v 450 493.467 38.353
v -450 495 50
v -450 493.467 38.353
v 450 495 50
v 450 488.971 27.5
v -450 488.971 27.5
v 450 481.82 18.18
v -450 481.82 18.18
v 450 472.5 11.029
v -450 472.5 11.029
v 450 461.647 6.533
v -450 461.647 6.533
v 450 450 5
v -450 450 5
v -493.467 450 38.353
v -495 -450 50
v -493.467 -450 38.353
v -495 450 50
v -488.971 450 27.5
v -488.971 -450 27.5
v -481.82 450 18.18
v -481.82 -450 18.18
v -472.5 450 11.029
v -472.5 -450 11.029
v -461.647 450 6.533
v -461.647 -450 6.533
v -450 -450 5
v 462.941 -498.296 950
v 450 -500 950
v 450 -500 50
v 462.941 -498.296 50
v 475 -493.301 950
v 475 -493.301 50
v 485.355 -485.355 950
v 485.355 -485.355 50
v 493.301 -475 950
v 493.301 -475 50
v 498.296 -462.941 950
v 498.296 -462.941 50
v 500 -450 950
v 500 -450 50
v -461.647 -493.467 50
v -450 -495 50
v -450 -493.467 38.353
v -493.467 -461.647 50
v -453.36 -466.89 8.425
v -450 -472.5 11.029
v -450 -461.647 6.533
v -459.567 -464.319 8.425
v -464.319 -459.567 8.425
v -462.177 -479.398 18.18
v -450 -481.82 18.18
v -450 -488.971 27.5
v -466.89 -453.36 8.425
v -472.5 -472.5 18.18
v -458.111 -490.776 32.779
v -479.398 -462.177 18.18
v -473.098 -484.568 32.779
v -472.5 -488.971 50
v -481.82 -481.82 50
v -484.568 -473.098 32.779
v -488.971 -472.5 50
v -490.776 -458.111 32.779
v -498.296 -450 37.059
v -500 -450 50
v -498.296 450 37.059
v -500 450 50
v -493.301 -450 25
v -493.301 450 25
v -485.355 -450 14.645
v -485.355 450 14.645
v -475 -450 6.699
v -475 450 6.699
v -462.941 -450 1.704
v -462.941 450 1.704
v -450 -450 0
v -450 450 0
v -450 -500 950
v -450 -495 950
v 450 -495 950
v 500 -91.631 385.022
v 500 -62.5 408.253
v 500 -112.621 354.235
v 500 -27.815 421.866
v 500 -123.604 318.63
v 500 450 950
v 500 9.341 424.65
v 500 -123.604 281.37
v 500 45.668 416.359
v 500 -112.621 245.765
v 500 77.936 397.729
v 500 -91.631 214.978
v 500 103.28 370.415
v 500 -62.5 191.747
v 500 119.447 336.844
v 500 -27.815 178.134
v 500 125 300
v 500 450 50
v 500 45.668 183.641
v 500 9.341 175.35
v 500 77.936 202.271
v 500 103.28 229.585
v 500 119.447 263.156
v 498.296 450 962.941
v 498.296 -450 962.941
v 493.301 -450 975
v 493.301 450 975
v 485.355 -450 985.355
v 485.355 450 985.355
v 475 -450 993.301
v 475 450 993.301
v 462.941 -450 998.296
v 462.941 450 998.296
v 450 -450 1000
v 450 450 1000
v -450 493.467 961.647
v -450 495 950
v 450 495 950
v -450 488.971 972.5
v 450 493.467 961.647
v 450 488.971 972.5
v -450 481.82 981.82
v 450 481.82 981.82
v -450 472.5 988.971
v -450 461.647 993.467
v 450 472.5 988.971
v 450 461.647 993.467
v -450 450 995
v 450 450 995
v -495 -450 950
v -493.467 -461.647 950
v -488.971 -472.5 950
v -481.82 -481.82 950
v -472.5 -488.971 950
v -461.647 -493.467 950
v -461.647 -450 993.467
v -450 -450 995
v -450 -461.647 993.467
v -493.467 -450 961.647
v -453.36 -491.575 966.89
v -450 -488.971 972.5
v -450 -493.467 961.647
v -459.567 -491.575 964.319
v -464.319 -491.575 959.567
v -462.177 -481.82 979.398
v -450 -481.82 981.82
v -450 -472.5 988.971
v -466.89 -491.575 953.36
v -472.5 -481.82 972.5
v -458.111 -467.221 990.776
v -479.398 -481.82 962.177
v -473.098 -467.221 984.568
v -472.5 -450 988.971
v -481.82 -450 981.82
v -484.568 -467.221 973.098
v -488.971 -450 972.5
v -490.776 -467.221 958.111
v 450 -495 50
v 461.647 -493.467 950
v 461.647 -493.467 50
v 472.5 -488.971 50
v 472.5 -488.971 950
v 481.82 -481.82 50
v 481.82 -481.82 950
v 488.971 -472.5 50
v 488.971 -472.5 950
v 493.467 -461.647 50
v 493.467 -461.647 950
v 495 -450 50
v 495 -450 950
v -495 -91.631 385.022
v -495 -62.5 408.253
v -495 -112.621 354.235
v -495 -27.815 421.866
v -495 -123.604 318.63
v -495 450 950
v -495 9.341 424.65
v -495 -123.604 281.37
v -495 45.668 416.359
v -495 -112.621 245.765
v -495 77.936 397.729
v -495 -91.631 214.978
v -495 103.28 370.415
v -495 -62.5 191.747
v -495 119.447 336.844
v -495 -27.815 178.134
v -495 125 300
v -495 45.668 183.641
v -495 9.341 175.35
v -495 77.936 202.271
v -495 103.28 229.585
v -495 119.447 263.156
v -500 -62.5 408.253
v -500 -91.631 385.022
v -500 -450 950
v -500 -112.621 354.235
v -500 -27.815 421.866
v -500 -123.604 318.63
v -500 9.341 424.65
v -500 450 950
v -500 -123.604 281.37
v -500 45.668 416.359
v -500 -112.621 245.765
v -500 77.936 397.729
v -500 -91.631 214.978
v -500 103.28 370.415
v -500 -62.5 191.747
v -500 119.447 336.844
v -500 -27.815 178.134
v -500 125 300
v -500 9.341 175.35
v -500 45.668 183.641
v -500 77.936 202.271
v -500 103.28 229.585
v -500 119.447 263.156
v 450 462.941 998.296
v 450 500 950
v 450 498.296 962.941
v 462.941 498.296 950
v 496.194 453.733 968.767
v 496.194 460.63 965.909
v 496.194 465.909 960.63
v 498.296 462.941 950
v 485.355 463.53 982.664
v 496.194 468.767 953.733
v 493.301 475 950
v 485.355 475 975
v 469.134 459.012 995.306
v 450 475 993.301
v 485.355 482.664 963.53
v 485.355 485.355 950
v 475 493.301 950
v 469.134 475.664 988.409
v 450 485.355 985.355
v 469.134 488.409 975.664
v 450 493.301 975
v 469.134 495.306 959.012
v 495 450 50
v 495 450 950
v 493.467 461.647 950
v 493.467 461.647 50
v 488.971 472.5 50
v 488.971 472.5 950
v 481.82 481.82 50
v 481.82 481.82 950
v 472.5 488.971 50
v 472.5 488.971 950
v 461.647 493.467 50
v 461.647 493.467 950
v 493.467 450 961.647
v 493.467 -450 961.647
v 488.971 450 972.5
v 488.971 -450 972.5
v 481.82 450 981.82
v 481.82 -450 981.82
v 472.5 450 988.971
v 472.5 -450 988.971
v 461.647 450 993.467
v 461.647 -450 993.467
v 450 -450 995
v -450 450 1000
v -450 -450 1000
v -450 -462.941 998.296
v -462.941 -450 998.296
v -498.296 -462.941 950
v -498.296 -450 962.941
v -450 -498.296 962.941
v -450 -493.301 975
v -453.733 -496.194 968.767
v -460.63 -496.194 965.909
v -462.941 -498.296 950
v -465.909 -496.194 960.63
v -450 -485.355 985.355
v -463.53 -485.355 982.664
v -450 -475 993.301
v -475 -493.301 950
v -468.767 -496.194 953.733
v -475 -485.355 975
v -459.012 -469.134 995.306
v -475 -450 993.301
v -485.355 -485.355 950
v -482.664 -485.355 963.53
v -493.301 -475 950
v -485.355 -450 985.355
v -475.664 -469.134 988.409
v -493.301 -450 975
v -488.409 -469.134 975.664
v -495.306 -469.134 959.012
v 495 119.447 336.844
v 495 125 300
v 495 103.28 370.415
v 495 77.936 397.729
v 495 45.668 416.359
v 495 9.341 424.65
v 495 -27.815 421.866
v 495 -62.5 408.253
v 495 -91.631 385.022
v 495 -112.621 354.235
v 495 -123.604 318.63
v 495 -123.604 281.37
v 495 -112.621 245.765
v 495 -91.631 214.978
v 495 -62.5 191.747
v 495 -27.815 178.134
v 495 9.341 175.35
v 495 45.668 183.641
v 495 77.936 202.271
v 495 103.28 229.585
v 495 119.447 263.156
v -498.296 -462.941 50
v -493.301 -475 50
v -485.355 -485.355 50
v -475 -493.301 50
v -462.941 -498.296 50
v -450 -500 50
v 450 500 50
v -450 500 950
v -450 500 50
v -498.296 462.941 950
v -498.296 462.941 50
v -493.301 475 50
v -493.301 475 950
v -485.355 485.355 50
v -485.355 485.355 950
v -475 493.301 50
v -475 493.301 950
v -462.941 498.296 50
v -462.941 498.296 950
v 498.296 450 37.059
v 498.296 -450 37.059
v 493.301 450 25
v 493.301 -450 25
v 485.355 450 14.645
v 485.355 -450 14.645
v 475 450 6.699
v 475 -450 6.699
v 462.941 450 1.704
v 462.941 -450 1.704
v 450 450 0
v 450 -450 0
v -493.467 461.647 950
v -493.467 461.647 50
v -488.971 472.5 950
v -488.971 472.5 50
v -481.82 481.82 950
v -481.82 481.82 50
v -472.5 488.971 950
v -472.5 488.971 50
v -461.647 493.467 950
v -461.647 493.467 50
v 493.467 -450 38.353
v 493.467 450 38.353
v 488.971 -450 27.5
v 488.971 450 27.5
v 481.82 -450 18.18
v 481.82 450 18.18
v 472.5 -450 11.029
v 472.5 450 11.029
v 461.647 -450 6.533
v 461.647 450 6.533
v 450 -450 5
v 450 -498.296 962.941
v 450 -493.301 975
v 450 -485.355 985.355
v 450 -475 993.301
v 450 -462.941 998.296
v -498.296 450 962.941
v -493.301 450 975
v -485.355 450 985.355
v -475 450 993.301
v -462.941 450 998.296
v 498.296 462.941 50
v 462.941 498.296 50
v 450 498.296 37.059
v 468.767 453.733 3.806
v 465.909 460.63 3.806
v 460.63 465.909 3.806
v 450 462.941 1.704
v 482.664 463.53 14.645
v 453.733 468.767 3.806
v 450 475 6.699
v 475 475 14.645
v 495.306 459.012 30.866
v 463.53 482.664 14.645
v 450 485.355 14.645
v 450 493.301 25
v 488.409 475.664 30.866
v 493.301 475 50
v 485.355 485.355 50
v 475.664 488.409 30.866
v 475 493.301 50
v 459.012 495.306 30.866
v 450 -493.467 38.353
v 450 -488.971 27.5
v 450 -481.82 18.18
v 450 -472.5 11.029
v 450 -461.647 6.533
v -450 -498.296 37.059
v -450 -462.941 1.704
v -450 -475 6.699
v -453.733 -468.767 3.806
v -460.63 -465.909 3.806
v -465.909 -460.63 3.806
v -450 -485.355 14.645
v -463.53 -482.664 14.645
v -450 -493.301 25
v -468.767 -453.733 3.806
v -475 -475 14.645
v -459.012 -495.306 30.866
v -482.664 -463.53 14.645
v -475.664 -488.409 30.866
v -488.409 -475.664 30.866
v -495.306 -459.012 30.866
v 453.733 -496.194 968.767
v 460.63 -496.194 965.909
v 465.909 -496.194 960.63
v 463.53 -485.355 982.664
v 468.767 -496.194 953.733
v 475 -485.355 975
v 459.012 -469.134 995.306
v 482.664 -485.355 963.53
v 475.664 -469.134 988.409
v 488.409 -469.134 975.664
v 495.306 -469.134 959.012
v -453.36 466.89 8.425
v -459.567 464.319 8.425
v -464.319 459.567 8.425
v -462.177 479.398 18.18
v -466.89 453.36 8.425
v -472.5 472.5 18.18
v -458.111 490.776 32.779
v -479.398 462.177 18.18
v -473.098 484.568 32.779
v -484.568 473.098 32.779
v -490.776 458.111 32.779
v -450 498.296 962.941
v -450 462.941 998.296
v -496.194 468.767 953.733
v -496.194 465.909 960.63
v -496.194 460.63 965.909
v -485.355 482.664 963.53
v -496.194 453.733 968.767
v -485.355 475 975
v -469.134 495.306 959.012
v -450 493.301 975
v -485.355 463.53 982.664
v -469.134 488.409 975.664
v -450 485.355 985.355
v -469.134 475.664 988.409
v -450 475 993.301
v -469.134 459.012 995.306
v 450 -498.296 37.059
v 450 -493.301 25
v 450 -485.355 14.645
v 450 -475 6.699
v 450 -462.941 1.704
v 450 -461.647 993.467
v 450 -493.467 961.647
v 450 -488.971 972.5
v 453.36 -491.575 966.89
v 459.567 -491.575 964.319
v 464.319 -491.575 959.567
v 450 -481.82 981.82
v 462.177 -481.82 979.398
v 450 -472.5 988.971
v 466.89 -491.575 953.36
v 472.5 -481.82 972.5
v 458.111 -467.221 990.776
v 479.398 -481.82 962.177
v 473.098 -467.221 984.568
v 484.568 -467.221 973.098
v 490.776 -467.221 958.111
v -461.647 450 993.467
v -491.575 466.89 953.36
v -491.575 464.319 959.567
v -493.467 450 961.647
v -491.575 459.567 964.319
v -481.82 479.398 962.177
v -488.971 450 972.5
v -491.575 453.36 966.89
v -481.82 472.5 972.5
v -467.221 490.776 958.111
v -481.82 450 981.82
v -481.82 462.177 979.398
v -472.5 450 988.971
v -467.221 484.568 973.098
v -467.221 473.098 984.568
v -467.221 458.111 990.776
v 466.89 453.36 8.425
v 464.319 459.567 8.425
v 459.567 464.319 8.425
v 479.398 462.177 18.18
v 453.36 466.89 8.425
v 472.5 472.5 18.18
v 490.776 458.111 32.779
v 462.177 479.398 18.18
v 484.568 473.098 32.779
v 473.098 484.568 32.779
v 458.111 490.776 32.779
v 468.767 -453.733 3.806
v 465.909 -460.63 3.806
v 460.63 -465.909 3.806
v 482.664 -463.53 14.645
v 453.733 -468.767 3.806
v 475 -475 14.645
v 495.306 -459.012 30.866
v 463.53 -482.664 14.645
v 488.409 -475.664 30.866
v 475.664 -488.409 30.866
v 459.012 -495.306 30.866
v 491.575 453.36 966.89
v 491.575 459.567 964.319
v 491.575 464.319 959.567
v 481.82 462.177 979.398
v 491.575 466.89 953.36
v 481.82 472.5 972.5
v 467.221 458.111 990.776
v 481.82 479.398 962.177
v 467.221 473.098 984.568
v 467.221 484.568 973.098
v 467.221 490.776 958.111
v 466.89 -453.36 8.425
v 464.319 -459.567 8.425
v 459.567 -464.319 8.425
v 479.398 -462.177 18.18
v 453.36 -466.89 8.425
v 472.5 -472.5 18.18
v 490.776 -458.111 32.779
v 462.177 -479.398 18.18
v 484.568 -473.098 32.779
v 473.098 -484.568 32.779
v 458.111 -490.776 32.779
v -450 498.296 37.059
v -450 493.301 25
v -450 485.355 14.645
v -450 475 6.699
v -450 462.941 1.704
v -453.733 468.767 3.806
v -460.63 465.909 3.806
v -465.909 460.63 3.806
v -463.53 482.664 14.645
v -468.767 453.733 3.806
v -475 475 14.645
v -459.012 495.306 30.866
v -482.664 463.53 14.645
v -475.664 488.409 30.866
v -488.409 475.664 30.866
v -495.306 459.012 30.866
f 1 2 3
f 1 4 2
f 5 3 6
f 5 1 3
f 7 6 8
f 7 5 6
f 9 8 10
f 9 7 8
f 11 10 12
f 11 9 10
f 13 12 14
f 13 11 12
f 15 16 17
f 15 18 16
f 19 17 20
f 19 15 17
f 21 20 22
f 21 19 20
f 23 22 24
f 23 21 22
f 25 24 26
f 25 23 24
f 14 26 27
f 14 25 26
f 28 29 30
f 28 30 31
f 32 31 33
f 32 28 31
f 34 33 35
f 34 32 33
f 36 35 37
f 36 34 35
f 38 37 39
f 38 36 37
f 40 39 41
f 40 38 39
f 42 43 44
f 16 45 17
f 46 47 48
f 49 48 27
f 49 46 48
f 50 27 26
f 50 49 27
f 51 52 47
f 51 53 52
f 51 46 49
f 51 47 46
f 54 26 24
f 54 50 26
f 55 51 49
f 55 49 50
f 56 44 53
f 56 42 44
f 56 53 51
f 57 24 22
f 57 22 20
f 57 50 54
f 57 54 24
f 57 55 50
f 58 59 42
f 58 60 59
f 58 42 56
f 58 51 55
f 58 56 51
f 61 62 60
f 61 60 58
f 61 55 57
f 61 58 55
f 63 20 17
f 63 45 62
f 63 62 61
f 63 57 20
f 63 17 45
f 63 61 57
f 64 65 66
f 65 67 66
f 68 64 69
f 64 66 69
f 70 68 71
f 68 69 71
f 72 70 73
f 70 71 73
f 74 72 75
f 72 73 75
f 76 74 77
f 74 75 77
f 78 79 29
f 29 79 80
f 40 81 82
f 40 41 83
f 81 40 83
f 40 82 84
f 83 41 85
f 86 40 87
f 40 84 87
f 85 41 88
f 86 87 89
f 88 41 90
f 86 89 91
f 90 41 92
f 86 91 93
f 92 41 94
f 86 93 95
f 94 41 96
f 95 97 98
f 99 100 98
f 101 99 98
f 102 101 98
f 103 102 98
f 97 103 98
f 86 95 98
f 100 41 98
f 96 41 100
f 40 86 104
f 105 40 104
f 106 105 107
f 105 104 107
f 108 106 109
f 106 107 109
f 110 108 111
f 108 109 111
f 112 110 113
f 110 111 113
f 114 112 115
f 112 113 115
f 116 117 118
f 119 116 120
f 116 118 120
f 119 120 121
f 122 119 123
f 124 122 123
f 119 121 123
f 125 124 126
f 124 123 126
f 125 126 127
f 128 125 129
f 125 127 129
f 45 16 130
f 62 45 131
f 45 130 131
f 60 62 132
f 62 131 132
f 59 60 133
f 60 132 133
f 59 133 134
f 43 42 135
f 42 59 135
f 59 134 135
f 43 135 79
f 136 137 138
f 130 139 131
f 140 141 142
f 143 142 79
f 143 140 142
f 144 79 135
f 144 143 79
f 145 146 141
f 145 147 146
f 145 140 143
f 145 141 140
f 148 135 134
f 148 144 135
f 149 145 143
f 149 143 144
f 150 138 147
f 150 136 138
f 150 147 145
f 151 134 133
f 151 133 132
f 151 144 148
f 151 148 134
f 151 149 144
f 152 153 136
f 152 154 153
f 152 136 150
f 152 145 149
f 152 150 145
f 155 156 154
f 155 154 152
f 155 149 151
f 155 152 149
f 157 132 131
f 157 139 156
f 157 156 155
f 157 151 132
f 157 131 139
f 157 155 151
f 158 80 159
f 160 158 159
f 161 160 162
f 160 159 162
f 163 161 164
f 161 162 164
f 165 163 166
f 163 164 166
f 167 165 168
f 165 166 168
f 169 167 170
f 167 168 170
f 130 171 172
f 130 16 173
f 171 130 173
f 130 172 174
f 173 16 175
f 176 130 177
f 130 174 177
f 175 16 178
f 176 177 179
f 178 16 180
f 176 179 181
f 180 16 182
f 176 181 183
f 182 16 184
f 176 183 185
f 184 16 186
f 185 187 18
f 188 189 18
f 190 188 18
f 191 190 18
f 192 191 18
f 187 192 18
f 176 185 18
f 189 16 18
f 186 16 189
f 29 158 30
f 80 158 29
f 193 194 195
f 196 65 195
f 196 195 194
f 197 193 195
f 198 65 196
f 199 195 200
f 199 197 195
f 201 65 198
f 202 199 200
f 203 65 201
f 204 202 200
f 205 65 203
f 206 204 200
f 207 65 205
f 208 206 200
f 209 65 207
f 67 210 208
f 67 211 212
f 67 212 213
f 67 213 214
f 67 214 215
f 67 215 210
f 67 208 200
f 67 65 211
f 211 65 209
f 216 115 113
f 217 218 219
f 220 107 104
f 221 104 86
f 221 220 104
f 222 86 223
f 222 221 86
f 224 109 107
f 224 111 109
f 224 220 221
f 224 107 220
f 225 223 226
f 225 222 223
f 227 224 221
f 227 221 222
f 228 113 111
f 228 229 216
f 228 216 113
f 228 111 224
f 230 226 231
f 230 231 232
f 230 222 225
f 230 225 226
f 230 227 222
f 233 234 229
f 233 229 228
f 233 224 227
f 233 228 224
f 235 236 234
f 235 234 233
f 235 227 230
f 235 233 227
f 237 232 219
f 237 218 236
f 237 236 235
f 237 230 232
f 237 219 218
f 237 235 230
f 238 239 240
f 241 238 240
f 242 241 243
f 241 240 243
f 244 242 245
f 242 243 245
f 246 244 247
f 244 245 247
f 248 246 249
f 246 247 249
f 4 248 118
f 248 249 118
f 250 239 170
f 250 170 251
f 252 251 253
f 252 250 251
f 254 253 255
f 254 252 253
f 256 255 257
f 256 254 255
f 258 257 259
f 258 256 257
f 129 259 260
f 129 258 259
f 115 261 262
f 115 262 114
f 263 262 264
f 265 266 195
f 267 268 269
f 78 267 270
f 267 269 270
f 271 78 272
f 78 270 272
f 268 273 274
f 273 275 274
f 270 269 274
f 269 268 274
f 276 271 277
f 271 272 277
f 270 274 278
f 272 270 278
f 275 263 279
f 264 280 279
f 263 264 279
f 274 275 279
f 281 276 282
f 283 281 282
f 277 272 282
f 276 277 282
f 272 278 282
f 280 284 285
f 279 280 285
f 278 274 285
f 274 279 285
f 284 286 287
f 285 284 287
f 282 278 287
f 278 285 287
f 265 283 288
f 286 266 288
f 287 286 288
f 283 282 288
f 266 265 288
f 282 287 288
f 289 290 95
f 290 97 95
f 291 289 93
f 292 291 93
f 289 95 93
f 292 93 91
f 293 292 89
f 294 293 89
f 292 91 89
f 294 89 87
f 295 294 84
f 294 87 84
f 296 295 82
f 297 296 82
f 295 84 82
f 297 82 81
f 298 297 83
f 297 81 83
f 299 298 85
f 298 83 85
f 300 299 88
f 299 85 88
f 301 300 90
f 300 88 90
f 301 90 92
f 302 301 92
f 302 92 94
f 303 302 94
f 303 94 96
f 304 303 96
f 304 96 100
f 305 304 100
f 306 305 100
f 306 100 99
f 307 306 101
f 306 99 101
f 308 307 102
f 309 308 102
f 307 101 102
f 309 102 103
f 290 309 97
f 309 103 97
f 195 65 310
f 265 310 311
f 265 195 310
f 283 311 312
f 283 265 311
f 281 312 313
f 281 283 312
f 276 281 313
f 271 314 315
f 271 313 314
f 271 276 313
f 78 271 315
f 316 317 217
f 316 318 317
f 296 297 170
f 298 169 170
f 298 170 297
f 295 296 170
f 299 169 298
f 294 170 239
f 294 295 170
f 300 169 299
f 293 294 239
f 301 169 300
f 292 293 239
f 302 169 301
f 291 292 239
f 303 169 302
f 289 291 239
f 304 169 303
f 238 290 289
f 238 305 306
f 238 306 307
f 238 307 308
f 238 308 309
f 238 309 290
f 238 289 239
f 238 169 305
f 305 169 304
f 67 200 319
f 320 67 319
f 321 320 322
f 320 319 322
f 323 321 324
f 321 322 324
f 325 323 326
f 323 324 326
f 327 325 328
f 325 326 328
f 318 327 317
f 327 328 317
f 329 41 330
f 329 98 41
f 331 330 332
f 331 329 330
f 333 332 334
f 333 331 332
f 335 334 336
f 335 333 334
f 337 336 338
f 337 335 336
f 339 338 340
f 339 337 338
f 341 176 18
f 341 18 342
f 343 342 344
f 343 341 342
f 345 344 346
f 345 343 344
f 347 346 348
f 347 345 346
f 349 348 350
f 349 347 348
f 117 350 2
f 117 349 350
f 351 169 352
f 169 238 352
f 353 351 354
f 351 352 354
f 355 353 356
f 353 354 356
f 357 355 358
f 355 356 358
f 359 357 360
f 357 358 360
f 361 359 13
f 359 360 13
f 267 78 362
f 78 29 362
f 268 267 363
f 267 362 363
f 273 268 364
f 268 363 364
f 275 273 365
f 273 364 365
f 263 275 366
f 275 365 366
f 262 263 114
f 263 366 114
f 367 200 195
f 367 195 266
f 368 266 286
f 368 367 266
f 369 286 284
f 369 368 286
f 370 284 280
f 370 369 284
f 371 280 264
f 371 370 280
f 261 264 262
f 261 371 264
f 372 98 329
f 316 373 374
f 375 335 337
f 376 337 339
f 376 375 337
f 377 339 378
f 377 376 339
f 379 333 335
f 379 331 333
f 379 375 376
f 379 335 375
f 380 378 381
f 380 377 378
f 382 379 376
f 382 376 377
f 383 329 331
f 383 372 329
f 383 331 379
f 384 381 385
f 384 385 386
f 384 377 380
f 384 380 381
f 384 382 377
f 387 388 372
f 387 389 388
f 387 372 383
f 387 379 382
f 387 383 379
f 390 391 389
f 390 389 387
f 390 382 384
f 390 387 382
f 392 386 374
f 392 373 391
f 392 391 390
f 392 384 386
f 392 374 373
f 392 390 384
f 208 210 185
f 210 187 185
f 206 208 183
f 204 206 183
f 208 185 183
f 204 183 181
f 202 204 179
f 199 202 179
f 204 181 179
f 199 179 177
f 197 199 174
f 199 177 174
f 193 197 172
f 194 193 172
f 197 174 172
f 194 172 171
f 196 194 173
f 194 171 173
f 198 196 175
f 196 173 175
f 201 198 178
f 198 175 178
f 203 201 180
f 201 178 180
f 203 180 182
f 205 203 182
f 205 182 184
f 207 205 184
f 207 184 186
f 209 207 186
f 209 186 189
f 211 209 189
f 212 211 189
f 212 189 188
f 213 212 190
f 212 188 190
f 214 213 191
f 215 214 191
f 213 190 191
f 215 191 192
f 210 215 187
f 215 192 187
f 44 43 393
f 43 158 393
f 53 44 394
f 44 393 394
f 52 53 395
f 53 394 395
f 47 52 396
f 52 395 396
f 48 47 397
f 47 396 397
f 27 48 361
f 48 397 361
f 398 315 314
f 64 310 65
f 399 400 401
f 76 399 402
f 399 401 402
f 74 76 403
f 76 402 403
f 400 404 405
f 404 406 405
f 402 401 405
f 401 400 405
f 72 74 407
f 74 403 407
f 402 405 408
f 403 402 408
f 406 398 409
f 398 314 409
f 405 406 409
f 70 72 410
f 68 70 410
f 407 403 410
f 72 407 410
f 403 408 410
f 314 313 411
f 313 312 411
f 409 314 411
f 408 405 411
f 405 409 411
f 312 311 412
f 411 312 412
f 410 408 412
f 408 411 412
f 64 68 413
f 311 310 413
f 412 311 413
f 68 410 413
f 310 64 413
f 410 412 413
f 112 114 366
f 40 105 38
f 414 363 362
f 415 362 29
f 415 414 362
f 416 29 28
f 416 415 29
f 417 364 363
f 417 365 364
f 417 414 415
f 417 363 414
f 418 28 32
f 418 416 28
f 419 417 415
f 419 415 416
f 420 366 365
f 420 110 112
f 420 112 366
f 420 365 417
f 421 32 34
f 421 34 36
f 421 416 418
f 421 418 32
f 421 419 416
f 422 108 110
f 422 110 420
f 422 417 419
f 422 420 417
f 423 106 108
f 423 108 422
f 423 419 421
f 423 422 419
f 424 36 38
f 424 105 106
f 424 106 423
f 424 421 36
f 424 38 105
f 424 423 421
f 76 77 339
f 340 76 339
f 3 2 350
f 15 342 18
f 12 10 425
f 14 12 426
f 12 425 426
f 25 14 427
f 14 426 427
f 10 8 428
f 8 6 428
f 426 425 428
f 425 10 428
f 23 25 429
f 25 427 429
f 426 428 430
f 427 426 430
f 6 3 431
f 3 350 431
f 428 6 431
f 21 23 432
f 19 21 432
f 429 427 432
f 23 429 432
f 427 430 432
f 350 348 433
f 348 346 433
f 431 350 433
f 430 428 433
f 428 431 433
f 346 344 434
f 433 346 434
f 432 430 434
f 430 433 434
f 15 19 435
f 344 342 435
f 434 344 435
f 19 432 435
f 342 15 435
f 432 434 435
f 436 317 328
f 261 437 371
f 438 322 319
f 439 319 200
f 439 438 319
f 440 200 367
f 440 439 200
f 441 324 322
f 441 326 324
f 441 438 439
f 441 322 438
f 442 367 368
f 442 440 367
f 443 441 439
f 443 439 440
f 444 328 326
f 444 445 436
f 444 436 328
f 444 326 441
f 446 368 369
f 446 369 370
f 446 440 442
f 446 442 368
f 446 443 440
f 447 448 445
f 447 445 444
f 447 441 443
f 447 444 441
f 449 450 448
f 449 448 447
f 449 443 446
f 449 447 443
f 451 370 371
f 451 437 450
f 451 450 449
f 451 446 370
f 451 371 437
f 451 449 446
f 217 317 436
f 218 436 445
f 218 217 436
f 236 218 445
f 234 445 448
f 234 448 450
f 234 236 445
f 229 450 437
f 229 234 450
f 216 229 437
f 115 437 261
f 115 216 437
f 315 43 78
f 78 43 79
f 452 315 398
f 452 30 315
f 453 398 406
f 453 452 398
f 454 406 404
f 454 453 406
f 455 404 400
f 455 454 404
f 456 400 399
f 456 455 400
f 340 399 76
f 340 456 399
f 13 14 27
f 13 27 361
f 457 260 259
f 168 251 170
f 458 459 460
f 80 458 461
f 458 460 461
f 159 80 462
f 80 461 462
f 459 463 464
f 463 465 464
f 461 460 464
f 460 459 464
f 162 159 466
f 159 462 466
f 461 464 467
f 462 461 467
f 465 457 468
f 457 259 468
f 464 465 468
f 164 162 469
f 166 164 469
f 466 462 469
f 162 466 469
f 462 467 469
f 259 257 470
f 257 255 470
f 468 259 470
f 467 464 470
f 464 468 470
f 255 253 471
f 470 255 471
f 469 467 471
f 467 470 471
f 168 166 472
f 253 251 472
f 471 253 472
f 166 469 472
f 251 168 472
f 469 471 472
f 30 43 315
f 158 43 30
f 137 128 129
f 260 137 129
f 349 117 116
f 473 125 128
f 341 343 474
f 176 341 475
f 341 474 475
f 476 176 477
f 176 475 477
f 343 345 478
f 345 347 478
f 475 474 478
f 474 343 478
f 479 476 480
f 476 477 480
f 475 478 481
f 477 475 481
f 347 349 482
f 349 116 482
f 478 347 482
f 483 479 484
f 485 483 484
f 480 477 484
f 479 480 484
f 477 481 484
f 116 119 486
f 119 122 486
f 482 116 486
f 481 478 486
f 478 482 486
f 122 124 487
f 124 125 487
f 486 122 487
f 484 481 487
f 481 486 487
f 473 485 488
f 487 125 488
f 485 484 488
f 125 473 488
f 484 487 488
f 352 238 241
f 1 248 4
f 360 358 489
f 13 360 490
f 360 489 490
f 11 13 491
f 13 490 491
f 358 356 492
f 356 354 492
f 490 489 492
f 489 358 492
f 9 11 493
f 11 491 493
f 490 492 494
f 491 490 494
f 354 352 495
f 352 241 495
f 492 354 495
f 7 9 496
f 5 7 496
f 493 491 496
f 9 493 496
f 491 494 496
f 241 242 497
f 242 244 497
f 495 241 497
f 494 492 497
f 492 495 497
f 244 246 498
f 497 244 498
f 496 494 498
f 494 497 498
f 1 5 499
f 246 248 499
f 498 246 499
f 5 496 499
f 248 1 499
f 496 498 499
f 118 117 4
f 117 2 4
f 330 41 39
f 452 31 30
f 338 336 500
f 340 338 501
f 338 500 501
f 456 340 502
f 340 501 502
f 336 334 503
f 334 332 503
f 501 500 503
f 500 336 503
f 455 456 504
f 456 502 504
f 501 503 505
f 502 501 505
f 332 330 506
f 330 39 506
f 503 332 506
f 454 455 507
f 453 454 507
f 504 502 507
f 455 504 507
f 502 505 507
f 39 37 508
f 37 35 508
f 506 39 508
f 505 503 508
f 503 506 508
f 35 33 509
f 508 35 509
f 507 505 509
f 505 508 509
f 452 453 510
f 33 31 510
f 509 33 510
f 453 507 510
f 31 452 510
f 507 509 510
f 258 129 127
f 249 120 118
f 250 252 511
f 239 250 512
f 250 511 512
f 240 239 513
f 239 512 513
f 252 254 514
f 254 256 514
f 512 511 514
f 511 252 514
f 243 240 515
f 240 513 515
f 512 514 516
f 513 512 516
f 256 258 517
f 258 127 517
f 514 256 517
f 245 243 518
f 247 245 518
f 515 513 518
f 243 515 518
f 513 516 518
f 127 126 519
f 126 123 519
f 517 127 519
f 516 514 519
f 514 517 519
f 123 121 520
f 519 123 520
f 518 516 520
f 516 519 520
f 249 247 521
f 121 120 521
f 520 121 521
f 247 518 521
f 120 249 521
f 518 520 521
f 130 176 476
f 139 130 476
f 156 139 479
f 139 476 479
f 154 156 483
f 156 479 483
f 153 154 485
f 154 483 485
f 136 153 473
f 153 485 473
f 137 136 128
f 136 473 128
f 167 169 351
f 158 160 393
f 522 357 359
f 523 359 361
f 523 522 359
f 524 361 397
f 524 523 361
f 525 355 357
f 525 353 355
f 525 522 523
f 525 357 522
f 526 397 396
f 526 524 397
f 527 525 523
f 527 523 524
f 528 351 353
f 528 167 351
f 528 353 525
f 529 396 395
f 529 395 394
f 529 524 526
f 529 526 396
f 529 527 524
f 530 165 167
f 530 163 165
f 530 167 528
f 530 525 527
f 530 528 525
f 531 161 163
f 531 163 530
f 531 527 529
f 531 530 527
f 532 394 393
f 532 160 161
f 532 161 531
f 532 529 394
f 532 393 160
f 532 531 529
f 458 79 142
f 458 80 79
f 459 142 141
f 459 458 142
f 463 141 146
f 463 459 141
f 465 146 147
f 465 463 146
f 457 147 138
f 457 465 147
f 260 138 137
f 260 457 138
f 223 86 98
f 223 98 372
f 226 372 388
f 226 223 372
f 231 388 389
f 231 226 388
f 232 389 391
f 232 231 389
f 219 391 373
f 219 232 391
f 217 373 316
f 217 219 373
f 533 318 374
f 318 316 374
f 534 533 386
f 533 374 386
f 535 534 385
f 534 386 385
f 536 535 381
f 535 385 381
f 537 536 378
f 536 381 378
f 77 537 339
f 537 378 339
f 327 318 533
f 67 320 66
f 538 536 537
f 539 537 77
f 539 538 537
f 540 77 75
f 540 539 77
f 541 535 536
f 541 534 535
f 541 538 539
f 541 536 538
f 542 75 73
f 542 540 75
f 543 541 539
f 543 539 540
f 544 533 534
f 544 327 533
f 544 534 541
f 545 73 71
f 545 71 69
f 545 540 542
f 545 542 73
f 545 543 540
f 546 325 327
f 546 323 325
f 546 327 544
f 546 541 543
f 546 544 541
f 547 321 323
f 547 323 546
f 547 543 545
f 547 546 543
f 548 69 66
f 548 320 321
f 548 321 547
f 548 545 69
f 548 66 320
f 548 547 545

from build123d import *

# Parameters (mm, degrees)
F0_W     = 1000
F0_H     = 1000
F1_DEPTH = 1000
F2_R     = 50
F3_T     = -5
F4_R     = 125
F5_DEPTH = 650


# Not quite as in the source:
# - a shell that OpenCascade refuses in one call is made with other operations: the cavity is built on its own and cut out


with BuildPart() as f1:
    # F0 (on Top) → F1 (new body)
    with BuildSketch(Plane.XY):
        Rectangle(F0_W, F0_H)
    extrude(amount=F1_DEPTH)

    # F2
    f2_edges = [f1.edges().sort_by_distance(p)[0] for p in [
        (0, 500, 1000),
        (-500, 500, 500),
        (-500, 0, 1000),
        (500, 0, 1000),
        (500, 500, 500),
        (0, -500, 1000),
        (-500, -500, 500),
        (500, -500, 500),
        (500, 0, 0),
        (0, -500, 0),
        (0, 500, 0),
        (-500, 0, 0),
    ]]
    fillet(f2_edges, radius=F2_R)

    # F3: a shell. OpenCascade refuses it in one call, so the cavity is built on its own and cut out:
    # the body offset inwards by the wall thickness, plus a prism from it out through each open face.
    f3_core = offset(f1.part, amount=F3_T, mode=Mode.PRIVATE)
    f3_exits = [f3_core.faces().sort_by_distance(p)[0] for p in [
        (0, -495, 500),
    ]]
    add(f3_core, mode=Mode.SUBTRACT)
    extrude(f3_exits, amount=-F3_T, mode=Mode.SUBTRACT)

    # F4 (on Right) → F5 (cut, symmetric)
    with BuildSketch(Plane.YZ):
        with Locations((0, 300)):
            Circle(F4_R)
    extrude(amount=F5_DEPTH, both=True, mode=Mode.SUBTRACT)


solid = f1.part
